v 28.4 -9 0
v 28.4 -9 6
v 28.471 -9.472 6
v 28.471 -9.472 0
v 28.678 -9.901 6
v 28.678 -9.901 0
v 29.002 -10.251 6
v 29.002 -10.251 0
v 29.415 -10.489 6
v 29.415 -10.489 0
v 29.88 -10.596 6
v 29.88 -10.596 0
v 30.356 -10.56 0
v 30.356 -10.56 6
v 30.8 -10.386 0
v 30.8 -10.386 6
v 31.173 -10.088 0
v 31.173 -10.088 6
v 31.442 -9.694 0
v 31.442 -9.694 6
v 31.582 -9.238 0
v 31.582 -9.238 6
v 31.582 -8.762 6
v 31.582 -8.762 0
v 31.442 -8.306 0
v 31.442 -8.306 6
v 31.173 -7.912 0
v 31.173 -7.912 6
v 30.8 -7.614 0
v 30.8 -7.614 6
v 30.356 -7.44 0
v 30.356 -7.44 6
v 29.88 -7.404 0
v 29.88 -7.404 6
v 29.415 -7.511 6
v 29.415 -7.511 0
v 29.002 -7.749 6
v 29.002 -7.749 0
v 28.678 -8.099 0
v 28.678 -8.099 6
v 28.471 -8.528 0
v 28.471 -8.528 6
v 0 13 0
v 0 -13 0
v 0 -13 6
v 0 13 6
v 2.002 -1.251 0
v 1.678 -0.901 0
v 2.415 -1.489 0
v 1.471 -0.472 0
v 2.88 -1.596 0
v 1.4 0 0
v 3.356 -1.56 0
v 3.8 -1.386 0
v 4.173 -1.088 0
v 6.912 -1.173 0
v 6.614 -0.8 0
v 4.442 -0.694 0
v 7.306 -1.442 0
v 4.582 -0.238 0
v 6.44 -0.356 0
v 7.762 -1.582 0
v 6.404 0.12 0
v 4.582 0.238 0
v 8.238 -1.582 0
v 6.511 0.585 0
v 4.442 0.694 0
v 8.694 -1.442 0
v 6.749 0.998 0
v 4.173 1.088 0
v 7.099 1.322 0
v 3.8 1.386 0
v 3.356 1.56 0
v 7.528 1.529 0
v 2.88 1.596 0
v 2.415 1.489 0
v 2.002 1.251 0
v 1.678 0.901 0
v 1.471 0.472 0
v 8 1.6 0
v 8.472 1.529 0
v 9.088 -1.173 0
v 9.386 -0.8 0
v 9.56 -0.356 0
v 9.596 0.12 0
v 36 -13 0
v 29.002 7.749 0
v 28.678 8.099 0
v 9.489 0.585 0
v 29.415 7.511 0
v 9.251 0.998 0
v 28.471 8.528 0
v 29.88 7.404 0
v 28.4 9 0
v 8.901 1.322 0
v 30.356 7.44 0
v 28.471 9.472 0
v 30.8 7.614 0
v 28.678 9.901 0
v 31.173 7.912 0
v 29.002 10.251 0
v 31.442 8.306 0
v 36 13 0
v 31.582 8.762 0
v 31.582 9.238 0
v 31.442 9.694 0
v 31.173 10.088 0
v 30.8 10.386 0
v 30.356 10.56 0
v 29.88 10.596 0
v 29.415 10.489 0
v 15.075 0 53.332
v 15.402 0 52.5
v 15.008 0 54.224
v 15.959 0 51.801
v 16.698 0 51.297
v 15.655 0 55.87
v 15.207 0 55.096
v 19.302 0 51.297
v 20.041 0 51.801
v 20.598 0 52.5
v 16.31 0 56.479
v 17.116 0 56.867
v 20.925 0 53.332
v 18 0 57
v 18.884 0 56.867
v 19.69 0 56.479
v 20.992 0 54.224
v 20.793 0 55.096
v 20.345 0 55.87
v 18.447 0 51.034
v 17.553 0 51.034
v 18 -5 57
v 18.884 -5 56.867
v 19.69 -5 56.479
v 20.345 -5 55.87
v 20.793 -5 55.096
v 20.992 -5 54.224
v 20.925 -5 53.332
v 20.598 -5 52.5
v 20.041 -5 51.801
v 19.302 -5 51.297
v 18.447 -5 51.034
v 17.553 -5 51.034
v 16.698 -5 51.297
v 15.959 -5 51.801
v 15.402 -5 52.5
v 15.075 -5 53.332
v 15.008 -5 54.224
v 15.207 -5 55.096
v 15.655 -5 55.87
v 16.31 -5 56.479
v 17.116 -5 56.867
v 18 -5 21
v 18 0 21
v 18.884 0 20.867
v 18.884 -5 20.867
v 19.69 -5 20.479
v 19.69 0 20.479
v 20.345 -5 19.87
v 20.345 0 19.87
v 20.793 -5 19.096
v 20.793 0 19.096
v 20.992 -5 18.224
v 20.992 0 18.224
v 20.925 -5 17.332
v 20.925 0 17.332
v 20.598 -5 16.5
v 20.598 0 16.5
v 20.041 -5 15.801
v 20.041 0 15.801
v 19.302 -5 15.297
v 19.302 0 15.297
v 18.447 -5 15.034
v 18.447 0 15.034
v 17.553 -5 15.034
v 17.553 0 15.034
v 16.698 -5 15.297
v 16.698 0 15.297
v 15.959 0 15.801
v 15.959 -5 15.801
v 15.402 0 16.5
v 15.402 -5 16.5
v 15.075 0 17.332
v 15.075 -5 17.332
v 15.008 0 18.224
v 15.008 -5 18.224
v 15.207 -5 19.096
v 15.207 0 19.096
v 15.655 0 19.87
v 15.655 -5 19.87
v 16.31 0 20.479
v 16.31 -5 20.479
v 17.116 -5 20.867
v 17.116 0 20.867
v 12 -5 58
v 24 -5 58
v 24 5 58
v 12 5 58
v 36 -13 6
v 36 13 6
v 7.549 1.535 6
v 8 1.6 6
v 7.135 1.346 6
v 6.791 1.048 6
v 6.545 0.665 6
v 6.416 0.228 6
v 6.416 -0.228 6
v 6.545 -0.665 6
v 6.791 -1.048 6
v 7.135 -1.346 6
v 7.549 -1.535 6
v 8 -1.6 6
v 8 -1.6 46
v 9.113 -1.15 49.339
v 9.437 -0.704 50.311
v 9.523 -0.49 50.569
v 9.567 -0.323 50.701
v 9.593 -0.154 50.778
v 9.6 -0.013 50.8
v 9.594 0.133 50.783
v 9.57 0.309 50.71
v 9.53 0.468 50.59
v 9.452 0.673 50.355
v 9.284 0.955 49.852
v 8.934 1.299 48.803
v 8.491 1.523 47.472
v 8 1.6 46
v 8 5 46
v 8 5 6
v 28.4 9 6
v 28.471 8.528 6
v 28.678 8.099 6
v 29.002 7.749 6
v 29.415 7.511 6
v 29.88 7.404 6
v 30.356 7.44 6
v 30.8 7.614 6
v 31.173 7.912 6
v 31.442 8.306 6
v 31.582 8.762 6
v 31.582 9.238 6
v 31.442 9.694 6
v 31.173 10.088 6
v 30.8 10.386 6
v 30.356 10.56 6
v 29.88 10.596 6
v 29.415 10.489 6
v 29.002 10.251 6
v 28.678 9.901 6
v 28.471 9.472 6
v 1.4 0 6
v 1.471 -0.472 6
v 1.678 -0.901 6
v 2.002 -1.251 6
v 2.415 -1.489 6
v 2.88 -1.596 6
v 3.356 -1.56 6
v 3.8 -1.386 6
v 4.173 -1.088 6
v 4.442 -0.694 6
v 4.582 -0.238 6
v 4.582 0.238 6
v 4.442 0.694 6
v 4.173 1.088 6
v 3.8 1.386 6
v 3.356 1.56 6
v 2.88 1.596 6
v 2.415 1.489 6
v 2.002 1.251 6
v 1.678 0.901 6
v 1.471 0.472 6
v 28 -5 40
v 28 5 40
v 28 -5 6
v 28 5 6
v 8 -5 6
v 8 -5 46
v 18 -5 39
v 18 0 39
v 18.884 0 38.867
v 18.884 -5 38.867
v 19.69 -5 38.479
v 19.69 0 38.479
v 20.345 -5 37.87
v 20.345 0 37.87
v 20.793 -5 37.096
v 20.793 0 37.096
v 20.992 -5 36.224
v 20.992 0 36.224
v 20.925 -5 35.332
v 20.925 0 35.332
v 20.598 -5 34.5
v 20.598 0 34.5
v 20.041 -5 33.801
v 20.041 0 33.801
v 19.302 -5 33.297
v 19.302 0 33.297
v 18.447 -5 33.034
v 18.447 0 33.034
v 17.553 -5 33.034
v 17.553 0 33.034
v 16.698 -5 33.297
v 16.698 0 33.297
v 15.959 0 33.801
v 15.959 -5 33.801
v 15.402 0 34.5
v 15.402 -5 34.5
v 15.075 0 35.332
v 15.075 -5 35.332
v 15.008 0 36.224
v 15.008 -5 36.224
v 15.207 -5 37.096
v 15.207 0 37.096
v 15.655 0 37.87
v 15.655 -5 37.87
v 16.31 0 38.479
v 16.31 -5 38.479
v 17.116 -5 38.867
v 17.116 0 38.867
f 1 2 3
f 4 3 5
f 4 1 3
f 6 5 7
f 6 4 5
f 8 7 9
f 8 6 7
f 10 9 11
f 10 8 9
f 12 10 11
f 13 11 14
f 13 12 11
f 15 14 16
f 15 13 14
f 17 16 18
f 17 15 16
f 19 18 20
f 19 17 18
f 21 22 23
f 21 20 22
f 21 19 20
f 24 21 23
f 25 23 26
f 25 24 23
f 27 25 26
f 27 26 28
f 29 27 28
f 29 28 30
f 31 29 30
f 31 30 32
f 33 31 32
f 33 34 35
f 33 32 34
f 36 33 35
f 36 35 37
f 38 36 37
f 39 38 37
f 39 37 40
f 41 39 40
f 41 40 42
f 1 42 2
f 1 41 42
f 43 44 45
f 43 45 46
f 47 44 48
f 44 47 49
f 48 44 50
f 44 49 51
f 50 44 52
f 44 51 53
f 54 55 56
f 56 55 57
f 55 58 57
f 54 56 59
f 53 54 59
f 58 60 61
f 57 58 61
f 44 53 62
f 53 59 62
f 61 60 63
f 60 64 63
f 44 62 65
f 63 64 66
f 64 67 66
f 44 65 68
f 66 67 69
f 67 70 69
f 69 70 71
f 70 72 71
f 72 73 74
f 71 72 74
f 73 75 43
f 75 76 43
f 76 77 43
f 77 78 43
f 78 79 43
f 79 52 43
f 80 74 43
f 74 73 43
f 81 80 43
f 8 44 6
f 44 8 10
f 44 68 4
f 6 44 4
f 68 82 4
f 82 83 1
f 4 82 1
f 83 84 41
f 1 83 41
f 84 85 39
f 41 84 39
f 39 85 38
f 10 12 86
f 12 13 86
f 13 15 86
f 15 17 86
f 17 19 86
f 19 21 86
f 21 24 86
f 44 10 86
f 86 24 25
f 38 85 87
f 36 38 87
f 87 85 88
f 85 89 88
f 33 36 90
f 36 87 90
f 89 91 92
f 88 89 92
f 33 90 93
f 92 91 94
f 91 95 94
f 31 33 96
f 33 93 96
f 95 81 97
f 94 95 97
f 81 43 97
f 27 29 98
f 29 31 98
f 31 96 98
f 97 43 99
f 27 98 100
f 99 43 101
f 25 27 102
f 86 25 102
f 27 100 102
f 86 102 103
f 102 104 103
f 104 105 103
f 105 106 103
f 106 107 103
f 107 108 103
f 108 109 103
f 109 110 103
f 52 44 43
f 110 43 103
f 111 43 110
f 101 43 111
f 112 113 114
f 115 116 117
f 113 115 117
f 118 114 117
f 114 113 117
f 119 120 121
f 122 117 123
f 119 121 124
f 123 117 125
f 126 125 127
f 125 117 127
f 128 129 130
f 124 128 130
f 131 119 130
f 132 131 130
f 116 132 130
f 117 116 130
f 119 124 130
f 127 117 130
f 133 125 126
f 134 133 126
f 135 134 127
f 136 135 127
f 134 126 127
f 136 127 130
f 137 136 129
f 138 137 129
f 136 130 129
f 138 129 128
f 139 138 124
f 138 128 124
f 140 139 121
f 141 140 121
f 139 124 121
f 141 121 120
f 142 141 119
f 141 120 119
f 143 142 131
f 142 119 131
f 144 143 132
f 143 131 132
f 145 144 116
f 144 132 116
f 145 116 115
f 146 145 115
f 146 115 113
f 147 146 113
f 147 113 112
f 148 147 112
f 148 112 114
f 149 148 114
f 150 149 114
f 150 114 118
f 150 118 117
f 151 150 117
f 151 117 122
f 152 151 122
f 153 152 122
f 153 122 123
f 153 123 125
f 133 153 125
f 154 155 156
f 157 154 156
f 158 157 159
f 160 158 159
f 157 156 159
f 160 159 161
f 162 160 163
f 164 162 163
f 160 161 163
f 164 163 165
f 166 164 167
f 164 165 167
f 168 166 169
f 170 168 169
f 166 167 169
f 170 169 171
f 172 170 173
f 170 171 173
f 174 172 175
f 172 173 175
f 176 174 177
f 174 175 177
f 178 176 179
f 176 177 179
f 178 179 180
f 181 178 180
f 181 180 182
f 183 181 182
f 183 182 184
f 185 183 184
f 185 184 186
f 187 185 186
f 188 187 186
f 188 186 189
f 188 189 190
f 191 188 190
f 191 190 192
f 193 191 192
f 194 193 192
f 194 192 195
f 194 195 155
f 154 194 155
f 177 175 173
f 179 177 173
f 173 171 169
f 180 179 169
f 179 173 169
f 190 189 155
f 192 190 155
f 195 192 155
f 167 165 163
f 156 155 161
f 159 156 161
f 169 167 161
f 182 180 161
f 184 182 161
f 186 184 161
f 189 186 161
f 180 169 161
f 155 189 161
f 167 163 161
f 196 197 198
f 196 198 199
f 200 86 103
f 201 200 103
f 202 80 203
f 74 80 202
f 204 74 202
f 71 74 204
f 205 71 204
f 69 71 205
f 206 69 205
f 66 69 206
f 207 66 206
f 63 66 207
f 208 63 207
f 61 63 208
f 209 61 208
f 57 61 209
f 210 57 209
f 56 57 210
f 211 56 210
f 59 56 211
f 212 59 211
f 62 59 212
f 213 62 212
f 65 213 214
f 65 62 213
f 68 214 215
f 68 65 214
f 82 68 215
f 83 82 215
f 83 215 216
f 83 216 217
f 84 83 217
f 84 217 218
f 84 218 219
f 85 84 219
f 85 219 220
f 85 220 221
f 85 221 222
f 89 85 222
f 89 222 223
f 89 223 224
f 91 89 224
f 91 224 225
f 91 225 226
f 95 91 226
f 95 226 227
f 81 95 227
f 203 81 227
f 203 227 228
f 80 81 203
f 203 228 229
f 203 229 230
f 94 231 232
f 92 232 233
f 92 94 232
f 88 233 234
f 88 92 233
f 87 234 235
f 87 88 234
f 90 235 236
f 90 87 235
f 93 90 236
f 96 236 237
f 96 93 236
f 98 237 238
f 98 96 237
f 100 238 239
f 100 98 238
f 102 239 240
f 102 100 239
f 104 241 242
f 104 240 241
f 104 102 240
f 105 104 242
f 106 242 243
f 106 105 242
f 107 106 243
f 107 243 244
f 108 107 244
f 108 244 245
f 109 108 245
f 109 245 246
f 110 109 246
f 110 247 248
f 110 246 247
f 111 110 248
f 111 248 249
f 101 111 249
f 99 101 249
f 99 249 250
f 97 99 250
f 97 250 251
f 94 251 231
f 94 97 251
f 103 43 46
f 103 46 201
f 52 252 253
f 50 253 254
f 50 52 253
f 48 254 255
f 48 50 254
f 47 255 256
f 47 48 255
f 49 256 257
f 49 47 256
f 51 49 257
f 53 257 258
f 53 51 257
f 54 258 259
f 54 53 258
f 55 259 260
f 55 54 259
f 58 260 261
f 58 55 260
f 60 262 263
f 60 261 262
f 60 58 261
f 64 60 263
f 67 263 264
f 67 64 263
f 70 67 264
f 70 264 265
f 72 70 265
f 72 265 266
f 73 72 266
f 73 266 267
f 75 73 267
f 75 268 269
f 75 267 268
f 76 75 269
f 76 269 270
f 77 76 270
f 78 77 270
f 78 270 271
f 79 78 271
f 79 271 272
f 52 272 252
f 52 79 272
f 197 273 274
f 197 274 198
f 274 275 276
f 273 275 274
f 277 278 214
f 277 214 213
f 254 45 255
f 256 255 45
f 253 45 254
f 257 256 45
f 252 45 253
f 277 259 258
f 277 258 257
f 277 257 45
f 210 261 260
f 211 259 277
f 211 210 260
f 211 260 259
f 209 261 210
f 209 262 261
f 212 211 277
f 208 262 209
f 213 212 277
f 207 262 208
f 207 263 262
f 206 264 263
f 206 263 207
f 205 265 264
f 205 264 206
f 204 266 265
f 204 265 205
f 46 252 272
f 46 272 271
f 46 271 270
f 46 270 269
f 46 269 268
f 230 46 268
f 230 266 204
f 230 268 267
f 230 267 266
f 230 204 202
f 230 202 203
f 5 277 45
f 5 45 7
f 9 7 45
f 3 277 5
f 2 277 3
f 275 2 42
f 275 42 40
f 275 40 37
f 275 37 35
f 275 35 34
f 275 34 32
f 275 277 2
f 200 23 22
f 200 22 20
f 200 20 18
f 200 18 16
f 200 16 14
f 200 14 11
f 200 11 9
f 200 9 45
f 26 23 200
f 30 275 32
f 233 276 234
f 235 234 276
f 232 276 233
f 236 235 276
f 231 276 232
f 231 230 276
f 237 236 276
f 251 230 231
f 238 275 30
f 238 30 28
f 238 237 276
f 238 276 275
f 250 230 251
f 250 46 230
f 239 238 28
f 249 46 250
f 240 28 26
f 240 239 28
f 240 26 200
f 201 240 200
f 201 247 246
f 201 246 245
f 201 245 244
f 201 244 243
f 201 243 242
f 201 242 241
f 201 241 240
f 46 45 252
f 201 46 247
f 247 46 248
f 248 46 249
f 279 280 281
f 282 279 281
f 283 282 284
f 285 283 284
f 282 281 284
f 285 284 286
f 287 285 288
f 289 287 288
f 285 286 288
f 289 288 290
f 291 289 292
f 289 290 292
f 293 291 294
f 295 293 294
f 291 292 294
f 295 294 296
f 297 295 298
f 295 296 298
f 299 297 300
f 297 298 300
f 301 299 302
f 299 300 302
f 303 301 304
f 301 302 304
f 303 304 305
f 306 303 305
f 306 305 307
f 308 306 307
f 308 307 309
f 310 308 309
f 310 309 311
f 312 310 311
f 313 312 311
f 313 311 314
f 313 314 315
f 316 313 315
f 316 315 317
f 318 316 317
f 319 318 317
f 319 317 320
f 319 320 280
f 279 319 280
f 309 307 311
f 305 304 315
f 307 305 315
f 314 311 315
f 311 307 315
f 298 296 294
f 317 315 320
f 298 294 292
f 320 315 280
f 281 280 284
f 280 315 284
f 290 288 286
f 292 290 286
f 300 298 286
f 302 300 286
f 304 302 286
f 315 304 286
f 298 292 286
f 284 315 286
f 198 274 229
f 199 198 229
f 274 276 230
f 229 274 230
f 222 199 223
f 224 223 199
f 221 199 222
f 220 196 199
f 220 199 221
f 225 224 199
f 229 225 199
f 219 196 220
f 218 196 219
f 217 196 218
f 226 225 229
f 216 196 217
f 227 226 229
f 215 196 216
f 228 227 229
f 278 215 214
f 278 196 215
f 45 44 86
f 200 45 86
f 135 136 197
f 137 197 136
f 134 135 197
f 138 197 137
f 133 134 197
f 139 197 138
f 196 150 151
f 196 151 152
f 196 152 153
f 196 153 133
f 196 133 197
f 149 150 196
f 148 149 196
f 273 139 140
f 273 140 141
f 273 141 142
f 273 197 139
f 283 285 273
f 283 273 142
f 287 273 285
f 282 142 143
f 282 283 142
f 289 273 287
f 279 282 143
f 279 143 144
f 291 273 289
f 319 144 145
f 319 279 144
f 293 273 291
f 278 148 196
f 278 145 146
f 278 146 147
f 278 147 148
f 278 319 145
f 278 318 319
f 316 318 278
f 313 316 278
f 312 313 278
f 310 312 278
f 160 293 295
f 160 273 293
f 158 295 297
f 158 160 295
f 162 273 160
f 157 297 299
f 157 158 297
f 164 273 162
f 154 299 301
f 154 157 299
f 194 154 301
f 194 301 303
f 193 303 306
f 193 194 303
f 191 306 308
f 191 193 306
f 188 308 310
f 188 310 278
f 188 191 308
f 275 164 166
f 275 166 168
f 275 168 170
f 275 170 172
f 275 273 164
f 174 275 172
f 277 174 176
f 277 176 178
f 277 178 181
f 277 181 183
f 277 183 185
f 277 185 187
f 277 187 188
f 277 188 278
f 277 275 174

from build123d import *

# Parameters (mm, degrees)
SKETCH_1_W          = 36
SKETCH_1_H          = 26
EXTRUDE_1_DEPTH     = 6
EXTRUDE_START       = -5
EXTRUDE_2_DEPTH     = 10
SKETCH_3_R          = 1.6
CUT_EXTRUDE_2_DEPTH = 70.491006612
SKETCH_4_R          = 3
CUT_EXTRUDE_3_DEPTH = 70.491006612


with BuildPart() as part:
    # 草图1 → 凸台-拉伸1 (new body)
    with BuildSketch(Plane.XY):
        with Locations((18, 0)):
            Rectangle(SKETCH_1_W, SKETCH_1_H)
    extrude(amount=EXTRUDE_1_DEPTH)

    # 草图2 → 凸台-拉伸2 (add)
    with BuildSketch(Plane(origin=(0, 0, 0), x_dir=(1, 0, 0), z_dir=(0, 1, 0)).offset(EXTRUDE_START)):
        Polygon((8, -6), (28, -6), (28, -40), (24, -58), (12, -58), (8, -46), align=None)
    extrude(amount=EXTRUDE_2_DEPTH)

    # 草图3 → 切除-拉伸2 (cut, through all)
    with BuildSketch(Plane.XY):
        with Locations(Location((8, 0, 0), (0, 0, 90))):
            Circle(SKETCH_3_R)
        with Locations(Location((30, -9, 0), (0, 0, 180))):
            Circle(SKETCH_3_R)
        with Locations(Location((30, 9, 0), (0, 0, 180))):
            Circle(SKETCH_3_R)
        with Locations(Location((3, 0, 0), (0, 0, 180))):
            Circle(SKETCH_3_R)
    extrude(amount=CUT_EXTRUDE_2_DEPTH, mode=Mode.SUBTRACT)

    # 草图4 → 切除-拉伸3 (cut, through all)
    with BuildSketch(Plane(origin=(0, 0, 0), x_dir=(1, 0, 0), z_dir=(0, 1, 0))):
        with Locations(Location((18, -54, 0), (0, 0, 270))):
            Circle(SKETCH_4_R)
        with Locations(Location((18, -18, 0), (0, 0, 270))):
            Circle(SKETCH_4_R)
        with Locations(Location((18, -36, 0), (0, 0, 270))):
            Circle(SKETCH_4_R)
    extrude(amount=-CUT_EXTRUDE_3_DEPTH, mode=Mode.SUBTRACT)


solid = part.part
